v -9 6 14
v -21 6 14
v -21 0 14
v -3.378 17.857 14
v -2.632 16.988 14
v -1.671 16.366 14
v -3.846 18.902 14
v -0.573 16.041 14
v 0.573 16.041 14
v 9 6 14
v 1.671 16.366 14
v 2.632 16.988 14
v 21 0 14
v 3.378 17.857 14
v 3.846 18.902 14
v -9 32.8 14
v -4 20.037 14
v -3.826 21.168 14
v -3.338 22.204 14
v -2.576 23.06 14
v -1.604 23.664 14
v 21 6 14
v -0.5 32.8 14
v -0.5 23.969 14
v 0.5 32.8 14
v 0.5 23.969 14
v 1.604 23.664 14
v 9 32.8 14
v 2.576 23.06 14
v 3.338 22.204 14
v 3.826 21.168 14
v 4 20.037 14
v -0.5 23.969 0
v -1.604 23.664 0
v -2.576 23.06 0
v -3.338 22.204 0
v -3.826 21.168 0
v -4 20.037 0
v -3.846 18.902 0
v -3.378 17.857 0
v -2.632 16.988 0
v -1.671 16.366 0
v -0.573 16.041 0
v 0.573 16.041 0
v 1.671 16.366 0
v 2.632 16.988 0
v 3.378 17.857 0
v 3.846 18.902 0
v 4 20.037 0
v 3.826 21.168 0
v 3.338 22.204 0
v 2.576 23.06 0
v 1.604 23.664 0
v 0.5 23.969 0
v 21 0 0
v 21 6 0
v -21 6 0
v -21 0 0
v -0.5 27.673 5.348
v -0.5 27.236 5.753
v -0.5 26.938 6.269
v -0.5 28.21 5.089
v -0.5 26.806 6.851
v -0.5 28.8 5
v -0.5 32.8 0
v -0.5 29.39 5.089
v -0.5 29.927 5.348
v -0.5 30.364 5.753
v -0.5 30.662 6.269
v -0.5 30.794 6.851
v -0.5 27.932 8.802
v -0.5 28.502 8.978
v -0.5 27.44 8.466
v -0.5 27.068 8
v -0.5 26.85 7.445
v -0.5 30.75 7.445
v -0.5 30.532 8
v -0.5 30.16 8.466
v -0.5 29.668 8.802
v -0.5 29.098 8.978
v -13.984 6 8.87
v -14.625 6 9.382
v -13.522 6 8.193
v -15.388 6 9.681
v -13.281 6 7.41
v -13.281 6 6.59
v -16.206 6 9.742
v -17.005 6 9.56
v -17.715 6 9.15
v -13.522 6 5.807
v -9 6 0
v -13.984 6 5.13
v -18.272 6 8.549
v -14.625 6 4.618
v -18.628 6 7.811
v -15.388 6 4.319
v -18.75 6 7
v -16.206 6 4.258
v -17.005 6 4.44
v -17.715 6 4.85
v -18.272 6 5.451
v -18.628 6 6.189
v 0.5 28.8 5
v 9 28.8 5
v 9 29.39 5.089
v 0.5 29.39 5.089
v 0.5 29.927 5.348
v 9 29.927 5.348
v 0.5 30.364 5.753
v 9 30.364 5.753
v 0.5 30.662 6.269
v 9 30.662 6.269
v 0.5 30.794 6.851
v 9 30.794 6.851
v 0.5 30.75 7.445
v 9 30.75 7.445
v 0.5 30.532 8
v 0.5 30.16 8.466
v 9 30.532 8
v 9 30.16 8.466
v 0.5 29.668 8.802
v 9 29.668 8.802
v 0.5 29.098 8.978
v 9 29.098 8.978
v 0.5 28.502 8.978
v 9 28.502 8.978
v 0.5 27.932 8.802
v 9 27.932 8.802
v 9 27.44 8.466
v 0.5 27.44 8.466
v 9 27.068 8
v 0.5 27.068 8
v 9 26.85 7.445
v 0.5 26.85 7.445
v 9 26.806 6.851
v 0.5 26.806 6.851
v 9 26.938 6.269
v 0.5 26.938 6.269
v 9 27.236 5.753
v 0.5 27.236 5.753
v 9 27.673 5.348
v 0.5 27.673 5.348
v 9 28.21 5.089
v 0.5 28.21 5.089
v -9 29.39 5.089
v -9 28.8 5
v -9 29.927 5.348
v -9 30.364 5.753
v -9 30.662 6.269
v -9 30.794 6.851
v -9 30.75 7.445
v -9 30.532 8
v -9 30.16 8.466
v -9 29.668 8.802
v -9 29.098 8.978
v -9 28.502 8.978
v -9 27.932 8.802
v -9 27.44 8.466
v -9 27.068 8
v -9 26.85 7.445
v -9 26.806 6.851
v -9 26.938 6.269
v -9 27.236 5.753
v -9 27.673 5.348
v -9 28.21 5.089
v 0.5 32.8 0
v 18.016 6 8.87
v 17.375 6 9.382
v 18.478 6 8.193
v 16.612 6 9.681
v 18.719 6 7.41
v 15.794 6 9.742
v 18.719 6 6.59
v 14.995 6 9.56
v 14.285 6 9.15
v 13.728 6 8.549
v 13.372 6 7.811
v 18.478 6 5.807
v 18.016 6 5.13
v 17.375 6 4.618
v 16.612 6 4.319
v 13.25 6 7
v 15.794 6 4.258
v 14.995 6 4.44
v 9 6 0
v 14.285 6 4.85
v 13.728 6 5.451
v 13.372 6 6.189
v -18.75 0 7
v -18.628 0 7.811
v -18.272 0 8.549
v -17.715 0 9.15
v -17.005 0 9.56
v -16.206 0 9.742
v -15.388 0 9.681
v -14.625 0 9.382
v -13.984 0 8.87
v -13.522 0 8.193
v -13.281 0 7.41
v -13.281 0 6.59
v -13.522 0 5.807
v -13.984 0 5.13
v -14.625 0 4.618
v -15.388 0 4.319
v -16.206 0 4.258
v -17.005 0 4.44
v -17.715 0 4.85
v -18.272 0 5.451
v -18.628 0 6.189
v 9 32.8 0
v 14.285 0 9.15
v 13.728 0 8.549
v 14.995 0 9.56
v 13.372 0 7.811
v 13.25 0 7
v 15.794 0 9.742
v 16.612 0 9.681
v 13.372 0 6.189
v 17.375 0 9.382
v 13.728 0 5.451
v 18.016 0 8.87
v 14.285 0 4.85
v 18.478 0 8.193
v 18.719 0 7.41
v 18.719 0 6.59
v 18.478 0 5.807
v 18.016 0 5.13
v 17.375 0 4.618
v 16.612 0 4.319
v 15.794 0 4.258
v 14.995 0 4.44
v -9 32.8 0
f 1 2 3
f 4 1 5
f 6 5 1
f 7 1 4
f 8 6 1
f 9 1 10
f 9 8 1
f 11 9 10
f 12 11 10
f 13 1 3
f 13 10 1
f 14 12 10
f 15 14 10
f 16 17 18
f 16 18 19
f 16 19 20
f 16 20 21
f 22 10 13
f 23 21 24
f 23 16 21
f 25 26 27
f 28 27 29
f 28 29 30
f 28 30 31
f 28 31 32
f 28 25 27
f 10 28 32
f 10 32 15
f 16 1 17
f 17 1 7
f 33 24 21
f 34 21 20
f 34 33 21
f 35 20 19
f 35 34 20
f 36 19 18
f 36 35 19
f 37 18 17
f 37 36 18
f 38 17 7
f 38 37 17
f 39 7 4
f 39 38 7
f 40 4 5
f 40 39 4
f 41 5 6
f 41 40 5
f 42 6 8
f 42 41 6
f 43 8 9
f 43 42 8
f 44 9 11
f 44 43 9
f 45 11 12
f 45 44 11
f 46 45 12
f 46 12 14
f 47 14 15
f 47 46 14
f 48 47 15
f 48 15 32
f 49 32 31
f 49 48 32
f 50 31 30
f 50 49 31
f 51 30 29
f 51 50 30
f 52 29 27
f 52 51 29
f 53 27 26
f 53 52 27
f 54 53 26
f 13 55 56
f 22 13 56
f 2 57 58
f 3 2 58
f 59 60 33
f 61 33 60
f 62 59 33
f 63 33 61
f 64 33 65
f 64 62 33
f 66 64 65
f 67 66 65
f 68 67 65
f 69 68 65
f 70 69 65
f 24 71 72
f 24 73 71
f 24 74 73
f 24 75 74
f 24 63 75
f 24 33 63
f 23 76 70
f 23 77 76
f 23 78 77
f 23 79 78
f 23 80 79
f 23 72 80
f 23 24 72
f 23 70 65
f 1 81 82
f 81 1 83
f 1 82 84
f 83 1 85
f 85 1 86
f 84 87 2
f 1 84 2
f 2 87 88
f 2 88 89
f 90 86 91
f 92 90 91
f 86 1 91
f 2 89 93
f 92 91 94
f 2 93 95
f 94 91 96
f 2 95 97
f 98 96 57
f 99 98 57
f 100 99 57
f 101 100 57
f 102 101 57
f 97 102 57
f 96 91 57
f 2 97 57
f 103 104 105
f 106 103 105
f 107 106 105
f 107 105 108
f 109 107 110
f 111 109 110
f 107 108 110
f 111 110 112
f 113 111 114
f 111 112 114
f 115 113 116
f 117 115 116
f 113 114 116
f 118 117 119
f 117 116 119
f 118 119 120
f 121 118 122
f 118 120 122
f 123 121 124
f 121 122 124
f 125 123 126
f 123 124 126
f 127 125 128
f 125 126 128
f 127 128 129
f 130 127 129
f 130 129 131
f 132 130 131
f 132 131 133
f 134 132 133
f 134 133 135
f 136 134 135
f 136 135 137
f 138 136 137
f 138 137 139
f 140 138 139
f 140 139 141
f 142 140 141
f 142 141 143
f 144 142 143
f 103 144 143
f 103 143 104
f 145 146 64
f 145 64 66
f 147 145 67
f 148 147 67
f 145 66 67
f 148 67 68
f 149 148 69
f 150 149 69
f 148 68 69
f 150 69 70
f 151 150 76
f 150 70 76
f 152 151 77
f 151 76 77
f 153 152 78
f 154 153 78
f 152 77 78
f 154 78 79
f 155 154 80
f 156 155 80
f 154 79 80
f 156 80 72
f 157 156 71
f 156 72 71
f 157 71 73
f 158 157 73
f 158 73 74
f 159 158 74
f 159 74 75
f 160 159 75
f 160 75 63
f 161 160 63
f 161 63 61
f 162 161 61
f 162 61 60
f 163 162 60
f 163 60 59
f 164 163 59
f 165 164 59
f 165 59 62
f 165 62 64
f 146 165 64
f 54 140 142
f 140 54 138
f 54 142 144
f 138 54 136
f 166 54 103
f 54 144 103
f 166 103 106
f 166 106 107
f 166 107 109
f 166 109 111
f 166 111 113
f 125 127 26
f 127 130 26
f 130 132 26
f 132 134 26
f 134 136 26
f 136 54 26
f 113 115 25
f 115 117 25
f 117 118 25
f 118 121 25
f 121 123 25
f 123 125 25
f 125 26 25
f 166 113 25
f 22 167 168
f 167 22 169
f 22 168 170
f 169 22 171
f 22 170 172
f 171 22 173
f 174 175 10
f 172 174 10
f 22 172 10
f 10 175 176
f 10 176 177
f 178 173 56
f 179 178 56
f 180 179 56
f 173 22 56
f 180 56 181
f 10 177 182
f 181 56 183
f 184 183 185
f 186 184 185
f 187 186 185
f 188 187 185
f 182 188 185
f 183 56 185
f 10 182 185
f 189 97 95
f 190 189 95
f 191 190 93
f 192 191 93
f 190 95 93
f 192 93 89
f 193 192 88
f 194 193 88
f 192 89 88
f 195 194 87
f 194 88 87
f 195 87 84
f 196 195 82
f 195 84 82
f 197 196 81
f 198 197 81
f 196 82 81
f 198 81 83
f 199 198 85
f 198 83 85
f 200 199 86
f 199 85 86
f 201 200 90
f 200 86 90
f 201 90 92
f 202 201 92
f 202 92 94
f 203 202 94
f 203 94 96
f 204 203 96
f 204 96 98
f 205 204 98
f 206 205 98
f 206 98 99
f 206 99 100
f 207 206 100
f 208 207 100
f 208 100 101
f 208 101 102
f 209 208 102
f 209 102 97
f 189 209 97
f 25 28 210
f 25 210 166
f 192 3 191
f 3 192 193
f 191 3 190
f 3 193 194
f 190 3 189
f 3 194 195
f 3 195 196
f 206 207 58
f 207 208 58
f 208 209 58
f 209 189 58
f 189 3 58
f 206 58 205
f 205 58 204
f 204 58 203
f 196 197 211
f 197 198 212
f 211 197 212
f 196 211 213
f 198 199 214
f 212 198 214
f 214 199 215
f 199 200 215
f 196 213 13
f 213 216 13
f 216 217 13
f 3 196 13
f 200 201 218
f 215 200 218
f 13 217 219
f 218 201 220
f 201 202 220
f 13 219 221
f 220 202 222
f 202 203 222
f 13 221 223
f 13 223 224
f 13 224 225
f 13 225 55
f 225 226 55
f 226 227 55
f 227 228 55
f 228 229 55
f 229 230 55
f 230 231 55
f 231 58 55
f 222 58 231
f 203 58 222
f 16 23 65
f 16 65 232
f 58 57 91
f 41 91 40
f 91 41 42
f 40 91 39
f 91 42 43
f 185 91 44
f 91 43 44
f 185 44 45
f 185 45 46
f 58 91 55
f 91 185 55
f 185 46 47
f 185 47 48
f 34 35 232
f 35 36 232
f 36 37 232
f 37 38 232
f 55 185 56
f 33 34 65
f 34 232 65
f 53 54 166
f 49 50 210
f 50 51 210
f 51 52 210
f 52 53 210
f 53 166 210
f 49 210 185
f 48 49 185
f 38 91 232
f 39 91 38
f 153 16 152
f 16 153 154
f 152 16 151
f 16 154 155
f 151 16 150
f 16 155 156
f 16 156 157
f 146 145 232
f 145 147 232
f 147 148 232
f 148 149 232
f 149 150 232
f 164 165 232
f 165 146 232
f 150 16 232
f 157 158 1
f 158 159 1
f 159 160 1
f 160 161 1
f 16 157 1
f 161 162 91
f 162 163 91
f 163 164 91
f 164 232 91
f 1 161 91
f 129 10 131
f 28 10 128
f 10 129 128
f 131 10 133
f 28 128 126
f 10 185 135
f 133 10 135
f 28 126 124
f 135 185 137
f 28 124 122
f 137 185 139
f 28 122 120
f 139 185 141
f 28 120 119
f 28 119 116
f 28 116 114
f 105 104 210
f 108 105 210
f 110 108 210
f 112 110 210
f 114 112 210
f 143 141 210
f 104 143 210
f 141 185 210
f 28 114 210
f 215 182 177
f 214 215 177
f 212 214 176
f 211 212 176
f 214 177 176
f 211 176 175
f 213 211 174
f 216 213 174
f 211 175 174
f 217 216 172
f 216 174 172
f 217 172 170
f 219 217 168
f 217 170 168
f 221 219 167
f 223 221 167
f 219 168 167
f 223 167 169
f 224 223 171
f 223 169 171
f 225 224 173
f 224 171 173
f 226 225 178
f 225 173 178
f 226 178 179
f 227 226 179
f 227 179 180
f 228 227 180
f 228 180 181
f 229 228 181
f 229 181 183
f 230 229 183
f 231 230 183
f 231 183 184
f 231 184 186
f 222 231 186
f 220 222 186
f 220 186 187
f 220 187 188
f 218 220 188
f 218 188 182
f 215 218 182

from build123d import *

# Parameters (mm, degrees)
SKETCH1_R           = 4
BOSS_EXTRUDE1_DEPTH = 14
SKETCH3_W           = 1
SKETCH3_H           = 11.790173319
CUT_EXTRUDE1_DEPTH  = 19
SKETCH2_R           = 2
CUT_EXTRUDE3_DEPTH  = 31
SKETCH5_R           = 2.75
CUT_EXTRUDE5_DEPTH  = 22


with BuildPart() as part:
    # Sketch1 → Boss-Extrude1 (new body)
    with BuildSketch(Plane.XY):
        Polygon((-21, 0), (21, 0), (21, 6), (9, 6), (9, 32.8), (-9, 32.8), (-9, 6), (-21, 6), align=None)
        with Locations((0, 20)):
            Circle(SKETCH1_R, mode=Mode.SUBTRACT)
    extrude(amount=BOSS_EXTRUDE1_DEPTH)

    # Sketch3 → Cut-Extrude1 (cut)
    with BuildSketch(Plane.XY.offset(14)):
        with Locations((0, 26.904913341)):
            Rectangle(SKETCH3_W, SKETCH3_H)
    extrude(amount=-CUT_EXTRUDE1_DEPTH, mode=Mode.SUBTRACT)

    # Sketch2 → Cut-Extrude3 (cut)
    with BuildSketch(Plane(origin=(9, 0, 0), x_dir=(0, 0, -1), z_dir=(1, 0, 0))):
        with Locations((-7, 28.8)):
            Circle(SKETCH2_R)
    extrude(amount=-CUT_EXTRUDE3_DEPTH, mode=Mode.SUBTRACT)

    # Sketch5 → Cut-Extrude5 (cut)
    with BuildSketch(Plane(origin=(0, 6, 0), x_dir=(1, 0, 0), z_dir=(0, 1, 0))):
        with Locations(Location((16, -7, 0), (0, 0, 180))):
            Circle(SKETCH5_R)
        with Locations(Location((-16, -7, 0), (0, 0, 180))):
            Circle(SKETCH5_R)
    extrude(amount=-CUT_EXTRUDE5_DEPTH, mode=Mode.SUBTRACT)


solid = part.part
